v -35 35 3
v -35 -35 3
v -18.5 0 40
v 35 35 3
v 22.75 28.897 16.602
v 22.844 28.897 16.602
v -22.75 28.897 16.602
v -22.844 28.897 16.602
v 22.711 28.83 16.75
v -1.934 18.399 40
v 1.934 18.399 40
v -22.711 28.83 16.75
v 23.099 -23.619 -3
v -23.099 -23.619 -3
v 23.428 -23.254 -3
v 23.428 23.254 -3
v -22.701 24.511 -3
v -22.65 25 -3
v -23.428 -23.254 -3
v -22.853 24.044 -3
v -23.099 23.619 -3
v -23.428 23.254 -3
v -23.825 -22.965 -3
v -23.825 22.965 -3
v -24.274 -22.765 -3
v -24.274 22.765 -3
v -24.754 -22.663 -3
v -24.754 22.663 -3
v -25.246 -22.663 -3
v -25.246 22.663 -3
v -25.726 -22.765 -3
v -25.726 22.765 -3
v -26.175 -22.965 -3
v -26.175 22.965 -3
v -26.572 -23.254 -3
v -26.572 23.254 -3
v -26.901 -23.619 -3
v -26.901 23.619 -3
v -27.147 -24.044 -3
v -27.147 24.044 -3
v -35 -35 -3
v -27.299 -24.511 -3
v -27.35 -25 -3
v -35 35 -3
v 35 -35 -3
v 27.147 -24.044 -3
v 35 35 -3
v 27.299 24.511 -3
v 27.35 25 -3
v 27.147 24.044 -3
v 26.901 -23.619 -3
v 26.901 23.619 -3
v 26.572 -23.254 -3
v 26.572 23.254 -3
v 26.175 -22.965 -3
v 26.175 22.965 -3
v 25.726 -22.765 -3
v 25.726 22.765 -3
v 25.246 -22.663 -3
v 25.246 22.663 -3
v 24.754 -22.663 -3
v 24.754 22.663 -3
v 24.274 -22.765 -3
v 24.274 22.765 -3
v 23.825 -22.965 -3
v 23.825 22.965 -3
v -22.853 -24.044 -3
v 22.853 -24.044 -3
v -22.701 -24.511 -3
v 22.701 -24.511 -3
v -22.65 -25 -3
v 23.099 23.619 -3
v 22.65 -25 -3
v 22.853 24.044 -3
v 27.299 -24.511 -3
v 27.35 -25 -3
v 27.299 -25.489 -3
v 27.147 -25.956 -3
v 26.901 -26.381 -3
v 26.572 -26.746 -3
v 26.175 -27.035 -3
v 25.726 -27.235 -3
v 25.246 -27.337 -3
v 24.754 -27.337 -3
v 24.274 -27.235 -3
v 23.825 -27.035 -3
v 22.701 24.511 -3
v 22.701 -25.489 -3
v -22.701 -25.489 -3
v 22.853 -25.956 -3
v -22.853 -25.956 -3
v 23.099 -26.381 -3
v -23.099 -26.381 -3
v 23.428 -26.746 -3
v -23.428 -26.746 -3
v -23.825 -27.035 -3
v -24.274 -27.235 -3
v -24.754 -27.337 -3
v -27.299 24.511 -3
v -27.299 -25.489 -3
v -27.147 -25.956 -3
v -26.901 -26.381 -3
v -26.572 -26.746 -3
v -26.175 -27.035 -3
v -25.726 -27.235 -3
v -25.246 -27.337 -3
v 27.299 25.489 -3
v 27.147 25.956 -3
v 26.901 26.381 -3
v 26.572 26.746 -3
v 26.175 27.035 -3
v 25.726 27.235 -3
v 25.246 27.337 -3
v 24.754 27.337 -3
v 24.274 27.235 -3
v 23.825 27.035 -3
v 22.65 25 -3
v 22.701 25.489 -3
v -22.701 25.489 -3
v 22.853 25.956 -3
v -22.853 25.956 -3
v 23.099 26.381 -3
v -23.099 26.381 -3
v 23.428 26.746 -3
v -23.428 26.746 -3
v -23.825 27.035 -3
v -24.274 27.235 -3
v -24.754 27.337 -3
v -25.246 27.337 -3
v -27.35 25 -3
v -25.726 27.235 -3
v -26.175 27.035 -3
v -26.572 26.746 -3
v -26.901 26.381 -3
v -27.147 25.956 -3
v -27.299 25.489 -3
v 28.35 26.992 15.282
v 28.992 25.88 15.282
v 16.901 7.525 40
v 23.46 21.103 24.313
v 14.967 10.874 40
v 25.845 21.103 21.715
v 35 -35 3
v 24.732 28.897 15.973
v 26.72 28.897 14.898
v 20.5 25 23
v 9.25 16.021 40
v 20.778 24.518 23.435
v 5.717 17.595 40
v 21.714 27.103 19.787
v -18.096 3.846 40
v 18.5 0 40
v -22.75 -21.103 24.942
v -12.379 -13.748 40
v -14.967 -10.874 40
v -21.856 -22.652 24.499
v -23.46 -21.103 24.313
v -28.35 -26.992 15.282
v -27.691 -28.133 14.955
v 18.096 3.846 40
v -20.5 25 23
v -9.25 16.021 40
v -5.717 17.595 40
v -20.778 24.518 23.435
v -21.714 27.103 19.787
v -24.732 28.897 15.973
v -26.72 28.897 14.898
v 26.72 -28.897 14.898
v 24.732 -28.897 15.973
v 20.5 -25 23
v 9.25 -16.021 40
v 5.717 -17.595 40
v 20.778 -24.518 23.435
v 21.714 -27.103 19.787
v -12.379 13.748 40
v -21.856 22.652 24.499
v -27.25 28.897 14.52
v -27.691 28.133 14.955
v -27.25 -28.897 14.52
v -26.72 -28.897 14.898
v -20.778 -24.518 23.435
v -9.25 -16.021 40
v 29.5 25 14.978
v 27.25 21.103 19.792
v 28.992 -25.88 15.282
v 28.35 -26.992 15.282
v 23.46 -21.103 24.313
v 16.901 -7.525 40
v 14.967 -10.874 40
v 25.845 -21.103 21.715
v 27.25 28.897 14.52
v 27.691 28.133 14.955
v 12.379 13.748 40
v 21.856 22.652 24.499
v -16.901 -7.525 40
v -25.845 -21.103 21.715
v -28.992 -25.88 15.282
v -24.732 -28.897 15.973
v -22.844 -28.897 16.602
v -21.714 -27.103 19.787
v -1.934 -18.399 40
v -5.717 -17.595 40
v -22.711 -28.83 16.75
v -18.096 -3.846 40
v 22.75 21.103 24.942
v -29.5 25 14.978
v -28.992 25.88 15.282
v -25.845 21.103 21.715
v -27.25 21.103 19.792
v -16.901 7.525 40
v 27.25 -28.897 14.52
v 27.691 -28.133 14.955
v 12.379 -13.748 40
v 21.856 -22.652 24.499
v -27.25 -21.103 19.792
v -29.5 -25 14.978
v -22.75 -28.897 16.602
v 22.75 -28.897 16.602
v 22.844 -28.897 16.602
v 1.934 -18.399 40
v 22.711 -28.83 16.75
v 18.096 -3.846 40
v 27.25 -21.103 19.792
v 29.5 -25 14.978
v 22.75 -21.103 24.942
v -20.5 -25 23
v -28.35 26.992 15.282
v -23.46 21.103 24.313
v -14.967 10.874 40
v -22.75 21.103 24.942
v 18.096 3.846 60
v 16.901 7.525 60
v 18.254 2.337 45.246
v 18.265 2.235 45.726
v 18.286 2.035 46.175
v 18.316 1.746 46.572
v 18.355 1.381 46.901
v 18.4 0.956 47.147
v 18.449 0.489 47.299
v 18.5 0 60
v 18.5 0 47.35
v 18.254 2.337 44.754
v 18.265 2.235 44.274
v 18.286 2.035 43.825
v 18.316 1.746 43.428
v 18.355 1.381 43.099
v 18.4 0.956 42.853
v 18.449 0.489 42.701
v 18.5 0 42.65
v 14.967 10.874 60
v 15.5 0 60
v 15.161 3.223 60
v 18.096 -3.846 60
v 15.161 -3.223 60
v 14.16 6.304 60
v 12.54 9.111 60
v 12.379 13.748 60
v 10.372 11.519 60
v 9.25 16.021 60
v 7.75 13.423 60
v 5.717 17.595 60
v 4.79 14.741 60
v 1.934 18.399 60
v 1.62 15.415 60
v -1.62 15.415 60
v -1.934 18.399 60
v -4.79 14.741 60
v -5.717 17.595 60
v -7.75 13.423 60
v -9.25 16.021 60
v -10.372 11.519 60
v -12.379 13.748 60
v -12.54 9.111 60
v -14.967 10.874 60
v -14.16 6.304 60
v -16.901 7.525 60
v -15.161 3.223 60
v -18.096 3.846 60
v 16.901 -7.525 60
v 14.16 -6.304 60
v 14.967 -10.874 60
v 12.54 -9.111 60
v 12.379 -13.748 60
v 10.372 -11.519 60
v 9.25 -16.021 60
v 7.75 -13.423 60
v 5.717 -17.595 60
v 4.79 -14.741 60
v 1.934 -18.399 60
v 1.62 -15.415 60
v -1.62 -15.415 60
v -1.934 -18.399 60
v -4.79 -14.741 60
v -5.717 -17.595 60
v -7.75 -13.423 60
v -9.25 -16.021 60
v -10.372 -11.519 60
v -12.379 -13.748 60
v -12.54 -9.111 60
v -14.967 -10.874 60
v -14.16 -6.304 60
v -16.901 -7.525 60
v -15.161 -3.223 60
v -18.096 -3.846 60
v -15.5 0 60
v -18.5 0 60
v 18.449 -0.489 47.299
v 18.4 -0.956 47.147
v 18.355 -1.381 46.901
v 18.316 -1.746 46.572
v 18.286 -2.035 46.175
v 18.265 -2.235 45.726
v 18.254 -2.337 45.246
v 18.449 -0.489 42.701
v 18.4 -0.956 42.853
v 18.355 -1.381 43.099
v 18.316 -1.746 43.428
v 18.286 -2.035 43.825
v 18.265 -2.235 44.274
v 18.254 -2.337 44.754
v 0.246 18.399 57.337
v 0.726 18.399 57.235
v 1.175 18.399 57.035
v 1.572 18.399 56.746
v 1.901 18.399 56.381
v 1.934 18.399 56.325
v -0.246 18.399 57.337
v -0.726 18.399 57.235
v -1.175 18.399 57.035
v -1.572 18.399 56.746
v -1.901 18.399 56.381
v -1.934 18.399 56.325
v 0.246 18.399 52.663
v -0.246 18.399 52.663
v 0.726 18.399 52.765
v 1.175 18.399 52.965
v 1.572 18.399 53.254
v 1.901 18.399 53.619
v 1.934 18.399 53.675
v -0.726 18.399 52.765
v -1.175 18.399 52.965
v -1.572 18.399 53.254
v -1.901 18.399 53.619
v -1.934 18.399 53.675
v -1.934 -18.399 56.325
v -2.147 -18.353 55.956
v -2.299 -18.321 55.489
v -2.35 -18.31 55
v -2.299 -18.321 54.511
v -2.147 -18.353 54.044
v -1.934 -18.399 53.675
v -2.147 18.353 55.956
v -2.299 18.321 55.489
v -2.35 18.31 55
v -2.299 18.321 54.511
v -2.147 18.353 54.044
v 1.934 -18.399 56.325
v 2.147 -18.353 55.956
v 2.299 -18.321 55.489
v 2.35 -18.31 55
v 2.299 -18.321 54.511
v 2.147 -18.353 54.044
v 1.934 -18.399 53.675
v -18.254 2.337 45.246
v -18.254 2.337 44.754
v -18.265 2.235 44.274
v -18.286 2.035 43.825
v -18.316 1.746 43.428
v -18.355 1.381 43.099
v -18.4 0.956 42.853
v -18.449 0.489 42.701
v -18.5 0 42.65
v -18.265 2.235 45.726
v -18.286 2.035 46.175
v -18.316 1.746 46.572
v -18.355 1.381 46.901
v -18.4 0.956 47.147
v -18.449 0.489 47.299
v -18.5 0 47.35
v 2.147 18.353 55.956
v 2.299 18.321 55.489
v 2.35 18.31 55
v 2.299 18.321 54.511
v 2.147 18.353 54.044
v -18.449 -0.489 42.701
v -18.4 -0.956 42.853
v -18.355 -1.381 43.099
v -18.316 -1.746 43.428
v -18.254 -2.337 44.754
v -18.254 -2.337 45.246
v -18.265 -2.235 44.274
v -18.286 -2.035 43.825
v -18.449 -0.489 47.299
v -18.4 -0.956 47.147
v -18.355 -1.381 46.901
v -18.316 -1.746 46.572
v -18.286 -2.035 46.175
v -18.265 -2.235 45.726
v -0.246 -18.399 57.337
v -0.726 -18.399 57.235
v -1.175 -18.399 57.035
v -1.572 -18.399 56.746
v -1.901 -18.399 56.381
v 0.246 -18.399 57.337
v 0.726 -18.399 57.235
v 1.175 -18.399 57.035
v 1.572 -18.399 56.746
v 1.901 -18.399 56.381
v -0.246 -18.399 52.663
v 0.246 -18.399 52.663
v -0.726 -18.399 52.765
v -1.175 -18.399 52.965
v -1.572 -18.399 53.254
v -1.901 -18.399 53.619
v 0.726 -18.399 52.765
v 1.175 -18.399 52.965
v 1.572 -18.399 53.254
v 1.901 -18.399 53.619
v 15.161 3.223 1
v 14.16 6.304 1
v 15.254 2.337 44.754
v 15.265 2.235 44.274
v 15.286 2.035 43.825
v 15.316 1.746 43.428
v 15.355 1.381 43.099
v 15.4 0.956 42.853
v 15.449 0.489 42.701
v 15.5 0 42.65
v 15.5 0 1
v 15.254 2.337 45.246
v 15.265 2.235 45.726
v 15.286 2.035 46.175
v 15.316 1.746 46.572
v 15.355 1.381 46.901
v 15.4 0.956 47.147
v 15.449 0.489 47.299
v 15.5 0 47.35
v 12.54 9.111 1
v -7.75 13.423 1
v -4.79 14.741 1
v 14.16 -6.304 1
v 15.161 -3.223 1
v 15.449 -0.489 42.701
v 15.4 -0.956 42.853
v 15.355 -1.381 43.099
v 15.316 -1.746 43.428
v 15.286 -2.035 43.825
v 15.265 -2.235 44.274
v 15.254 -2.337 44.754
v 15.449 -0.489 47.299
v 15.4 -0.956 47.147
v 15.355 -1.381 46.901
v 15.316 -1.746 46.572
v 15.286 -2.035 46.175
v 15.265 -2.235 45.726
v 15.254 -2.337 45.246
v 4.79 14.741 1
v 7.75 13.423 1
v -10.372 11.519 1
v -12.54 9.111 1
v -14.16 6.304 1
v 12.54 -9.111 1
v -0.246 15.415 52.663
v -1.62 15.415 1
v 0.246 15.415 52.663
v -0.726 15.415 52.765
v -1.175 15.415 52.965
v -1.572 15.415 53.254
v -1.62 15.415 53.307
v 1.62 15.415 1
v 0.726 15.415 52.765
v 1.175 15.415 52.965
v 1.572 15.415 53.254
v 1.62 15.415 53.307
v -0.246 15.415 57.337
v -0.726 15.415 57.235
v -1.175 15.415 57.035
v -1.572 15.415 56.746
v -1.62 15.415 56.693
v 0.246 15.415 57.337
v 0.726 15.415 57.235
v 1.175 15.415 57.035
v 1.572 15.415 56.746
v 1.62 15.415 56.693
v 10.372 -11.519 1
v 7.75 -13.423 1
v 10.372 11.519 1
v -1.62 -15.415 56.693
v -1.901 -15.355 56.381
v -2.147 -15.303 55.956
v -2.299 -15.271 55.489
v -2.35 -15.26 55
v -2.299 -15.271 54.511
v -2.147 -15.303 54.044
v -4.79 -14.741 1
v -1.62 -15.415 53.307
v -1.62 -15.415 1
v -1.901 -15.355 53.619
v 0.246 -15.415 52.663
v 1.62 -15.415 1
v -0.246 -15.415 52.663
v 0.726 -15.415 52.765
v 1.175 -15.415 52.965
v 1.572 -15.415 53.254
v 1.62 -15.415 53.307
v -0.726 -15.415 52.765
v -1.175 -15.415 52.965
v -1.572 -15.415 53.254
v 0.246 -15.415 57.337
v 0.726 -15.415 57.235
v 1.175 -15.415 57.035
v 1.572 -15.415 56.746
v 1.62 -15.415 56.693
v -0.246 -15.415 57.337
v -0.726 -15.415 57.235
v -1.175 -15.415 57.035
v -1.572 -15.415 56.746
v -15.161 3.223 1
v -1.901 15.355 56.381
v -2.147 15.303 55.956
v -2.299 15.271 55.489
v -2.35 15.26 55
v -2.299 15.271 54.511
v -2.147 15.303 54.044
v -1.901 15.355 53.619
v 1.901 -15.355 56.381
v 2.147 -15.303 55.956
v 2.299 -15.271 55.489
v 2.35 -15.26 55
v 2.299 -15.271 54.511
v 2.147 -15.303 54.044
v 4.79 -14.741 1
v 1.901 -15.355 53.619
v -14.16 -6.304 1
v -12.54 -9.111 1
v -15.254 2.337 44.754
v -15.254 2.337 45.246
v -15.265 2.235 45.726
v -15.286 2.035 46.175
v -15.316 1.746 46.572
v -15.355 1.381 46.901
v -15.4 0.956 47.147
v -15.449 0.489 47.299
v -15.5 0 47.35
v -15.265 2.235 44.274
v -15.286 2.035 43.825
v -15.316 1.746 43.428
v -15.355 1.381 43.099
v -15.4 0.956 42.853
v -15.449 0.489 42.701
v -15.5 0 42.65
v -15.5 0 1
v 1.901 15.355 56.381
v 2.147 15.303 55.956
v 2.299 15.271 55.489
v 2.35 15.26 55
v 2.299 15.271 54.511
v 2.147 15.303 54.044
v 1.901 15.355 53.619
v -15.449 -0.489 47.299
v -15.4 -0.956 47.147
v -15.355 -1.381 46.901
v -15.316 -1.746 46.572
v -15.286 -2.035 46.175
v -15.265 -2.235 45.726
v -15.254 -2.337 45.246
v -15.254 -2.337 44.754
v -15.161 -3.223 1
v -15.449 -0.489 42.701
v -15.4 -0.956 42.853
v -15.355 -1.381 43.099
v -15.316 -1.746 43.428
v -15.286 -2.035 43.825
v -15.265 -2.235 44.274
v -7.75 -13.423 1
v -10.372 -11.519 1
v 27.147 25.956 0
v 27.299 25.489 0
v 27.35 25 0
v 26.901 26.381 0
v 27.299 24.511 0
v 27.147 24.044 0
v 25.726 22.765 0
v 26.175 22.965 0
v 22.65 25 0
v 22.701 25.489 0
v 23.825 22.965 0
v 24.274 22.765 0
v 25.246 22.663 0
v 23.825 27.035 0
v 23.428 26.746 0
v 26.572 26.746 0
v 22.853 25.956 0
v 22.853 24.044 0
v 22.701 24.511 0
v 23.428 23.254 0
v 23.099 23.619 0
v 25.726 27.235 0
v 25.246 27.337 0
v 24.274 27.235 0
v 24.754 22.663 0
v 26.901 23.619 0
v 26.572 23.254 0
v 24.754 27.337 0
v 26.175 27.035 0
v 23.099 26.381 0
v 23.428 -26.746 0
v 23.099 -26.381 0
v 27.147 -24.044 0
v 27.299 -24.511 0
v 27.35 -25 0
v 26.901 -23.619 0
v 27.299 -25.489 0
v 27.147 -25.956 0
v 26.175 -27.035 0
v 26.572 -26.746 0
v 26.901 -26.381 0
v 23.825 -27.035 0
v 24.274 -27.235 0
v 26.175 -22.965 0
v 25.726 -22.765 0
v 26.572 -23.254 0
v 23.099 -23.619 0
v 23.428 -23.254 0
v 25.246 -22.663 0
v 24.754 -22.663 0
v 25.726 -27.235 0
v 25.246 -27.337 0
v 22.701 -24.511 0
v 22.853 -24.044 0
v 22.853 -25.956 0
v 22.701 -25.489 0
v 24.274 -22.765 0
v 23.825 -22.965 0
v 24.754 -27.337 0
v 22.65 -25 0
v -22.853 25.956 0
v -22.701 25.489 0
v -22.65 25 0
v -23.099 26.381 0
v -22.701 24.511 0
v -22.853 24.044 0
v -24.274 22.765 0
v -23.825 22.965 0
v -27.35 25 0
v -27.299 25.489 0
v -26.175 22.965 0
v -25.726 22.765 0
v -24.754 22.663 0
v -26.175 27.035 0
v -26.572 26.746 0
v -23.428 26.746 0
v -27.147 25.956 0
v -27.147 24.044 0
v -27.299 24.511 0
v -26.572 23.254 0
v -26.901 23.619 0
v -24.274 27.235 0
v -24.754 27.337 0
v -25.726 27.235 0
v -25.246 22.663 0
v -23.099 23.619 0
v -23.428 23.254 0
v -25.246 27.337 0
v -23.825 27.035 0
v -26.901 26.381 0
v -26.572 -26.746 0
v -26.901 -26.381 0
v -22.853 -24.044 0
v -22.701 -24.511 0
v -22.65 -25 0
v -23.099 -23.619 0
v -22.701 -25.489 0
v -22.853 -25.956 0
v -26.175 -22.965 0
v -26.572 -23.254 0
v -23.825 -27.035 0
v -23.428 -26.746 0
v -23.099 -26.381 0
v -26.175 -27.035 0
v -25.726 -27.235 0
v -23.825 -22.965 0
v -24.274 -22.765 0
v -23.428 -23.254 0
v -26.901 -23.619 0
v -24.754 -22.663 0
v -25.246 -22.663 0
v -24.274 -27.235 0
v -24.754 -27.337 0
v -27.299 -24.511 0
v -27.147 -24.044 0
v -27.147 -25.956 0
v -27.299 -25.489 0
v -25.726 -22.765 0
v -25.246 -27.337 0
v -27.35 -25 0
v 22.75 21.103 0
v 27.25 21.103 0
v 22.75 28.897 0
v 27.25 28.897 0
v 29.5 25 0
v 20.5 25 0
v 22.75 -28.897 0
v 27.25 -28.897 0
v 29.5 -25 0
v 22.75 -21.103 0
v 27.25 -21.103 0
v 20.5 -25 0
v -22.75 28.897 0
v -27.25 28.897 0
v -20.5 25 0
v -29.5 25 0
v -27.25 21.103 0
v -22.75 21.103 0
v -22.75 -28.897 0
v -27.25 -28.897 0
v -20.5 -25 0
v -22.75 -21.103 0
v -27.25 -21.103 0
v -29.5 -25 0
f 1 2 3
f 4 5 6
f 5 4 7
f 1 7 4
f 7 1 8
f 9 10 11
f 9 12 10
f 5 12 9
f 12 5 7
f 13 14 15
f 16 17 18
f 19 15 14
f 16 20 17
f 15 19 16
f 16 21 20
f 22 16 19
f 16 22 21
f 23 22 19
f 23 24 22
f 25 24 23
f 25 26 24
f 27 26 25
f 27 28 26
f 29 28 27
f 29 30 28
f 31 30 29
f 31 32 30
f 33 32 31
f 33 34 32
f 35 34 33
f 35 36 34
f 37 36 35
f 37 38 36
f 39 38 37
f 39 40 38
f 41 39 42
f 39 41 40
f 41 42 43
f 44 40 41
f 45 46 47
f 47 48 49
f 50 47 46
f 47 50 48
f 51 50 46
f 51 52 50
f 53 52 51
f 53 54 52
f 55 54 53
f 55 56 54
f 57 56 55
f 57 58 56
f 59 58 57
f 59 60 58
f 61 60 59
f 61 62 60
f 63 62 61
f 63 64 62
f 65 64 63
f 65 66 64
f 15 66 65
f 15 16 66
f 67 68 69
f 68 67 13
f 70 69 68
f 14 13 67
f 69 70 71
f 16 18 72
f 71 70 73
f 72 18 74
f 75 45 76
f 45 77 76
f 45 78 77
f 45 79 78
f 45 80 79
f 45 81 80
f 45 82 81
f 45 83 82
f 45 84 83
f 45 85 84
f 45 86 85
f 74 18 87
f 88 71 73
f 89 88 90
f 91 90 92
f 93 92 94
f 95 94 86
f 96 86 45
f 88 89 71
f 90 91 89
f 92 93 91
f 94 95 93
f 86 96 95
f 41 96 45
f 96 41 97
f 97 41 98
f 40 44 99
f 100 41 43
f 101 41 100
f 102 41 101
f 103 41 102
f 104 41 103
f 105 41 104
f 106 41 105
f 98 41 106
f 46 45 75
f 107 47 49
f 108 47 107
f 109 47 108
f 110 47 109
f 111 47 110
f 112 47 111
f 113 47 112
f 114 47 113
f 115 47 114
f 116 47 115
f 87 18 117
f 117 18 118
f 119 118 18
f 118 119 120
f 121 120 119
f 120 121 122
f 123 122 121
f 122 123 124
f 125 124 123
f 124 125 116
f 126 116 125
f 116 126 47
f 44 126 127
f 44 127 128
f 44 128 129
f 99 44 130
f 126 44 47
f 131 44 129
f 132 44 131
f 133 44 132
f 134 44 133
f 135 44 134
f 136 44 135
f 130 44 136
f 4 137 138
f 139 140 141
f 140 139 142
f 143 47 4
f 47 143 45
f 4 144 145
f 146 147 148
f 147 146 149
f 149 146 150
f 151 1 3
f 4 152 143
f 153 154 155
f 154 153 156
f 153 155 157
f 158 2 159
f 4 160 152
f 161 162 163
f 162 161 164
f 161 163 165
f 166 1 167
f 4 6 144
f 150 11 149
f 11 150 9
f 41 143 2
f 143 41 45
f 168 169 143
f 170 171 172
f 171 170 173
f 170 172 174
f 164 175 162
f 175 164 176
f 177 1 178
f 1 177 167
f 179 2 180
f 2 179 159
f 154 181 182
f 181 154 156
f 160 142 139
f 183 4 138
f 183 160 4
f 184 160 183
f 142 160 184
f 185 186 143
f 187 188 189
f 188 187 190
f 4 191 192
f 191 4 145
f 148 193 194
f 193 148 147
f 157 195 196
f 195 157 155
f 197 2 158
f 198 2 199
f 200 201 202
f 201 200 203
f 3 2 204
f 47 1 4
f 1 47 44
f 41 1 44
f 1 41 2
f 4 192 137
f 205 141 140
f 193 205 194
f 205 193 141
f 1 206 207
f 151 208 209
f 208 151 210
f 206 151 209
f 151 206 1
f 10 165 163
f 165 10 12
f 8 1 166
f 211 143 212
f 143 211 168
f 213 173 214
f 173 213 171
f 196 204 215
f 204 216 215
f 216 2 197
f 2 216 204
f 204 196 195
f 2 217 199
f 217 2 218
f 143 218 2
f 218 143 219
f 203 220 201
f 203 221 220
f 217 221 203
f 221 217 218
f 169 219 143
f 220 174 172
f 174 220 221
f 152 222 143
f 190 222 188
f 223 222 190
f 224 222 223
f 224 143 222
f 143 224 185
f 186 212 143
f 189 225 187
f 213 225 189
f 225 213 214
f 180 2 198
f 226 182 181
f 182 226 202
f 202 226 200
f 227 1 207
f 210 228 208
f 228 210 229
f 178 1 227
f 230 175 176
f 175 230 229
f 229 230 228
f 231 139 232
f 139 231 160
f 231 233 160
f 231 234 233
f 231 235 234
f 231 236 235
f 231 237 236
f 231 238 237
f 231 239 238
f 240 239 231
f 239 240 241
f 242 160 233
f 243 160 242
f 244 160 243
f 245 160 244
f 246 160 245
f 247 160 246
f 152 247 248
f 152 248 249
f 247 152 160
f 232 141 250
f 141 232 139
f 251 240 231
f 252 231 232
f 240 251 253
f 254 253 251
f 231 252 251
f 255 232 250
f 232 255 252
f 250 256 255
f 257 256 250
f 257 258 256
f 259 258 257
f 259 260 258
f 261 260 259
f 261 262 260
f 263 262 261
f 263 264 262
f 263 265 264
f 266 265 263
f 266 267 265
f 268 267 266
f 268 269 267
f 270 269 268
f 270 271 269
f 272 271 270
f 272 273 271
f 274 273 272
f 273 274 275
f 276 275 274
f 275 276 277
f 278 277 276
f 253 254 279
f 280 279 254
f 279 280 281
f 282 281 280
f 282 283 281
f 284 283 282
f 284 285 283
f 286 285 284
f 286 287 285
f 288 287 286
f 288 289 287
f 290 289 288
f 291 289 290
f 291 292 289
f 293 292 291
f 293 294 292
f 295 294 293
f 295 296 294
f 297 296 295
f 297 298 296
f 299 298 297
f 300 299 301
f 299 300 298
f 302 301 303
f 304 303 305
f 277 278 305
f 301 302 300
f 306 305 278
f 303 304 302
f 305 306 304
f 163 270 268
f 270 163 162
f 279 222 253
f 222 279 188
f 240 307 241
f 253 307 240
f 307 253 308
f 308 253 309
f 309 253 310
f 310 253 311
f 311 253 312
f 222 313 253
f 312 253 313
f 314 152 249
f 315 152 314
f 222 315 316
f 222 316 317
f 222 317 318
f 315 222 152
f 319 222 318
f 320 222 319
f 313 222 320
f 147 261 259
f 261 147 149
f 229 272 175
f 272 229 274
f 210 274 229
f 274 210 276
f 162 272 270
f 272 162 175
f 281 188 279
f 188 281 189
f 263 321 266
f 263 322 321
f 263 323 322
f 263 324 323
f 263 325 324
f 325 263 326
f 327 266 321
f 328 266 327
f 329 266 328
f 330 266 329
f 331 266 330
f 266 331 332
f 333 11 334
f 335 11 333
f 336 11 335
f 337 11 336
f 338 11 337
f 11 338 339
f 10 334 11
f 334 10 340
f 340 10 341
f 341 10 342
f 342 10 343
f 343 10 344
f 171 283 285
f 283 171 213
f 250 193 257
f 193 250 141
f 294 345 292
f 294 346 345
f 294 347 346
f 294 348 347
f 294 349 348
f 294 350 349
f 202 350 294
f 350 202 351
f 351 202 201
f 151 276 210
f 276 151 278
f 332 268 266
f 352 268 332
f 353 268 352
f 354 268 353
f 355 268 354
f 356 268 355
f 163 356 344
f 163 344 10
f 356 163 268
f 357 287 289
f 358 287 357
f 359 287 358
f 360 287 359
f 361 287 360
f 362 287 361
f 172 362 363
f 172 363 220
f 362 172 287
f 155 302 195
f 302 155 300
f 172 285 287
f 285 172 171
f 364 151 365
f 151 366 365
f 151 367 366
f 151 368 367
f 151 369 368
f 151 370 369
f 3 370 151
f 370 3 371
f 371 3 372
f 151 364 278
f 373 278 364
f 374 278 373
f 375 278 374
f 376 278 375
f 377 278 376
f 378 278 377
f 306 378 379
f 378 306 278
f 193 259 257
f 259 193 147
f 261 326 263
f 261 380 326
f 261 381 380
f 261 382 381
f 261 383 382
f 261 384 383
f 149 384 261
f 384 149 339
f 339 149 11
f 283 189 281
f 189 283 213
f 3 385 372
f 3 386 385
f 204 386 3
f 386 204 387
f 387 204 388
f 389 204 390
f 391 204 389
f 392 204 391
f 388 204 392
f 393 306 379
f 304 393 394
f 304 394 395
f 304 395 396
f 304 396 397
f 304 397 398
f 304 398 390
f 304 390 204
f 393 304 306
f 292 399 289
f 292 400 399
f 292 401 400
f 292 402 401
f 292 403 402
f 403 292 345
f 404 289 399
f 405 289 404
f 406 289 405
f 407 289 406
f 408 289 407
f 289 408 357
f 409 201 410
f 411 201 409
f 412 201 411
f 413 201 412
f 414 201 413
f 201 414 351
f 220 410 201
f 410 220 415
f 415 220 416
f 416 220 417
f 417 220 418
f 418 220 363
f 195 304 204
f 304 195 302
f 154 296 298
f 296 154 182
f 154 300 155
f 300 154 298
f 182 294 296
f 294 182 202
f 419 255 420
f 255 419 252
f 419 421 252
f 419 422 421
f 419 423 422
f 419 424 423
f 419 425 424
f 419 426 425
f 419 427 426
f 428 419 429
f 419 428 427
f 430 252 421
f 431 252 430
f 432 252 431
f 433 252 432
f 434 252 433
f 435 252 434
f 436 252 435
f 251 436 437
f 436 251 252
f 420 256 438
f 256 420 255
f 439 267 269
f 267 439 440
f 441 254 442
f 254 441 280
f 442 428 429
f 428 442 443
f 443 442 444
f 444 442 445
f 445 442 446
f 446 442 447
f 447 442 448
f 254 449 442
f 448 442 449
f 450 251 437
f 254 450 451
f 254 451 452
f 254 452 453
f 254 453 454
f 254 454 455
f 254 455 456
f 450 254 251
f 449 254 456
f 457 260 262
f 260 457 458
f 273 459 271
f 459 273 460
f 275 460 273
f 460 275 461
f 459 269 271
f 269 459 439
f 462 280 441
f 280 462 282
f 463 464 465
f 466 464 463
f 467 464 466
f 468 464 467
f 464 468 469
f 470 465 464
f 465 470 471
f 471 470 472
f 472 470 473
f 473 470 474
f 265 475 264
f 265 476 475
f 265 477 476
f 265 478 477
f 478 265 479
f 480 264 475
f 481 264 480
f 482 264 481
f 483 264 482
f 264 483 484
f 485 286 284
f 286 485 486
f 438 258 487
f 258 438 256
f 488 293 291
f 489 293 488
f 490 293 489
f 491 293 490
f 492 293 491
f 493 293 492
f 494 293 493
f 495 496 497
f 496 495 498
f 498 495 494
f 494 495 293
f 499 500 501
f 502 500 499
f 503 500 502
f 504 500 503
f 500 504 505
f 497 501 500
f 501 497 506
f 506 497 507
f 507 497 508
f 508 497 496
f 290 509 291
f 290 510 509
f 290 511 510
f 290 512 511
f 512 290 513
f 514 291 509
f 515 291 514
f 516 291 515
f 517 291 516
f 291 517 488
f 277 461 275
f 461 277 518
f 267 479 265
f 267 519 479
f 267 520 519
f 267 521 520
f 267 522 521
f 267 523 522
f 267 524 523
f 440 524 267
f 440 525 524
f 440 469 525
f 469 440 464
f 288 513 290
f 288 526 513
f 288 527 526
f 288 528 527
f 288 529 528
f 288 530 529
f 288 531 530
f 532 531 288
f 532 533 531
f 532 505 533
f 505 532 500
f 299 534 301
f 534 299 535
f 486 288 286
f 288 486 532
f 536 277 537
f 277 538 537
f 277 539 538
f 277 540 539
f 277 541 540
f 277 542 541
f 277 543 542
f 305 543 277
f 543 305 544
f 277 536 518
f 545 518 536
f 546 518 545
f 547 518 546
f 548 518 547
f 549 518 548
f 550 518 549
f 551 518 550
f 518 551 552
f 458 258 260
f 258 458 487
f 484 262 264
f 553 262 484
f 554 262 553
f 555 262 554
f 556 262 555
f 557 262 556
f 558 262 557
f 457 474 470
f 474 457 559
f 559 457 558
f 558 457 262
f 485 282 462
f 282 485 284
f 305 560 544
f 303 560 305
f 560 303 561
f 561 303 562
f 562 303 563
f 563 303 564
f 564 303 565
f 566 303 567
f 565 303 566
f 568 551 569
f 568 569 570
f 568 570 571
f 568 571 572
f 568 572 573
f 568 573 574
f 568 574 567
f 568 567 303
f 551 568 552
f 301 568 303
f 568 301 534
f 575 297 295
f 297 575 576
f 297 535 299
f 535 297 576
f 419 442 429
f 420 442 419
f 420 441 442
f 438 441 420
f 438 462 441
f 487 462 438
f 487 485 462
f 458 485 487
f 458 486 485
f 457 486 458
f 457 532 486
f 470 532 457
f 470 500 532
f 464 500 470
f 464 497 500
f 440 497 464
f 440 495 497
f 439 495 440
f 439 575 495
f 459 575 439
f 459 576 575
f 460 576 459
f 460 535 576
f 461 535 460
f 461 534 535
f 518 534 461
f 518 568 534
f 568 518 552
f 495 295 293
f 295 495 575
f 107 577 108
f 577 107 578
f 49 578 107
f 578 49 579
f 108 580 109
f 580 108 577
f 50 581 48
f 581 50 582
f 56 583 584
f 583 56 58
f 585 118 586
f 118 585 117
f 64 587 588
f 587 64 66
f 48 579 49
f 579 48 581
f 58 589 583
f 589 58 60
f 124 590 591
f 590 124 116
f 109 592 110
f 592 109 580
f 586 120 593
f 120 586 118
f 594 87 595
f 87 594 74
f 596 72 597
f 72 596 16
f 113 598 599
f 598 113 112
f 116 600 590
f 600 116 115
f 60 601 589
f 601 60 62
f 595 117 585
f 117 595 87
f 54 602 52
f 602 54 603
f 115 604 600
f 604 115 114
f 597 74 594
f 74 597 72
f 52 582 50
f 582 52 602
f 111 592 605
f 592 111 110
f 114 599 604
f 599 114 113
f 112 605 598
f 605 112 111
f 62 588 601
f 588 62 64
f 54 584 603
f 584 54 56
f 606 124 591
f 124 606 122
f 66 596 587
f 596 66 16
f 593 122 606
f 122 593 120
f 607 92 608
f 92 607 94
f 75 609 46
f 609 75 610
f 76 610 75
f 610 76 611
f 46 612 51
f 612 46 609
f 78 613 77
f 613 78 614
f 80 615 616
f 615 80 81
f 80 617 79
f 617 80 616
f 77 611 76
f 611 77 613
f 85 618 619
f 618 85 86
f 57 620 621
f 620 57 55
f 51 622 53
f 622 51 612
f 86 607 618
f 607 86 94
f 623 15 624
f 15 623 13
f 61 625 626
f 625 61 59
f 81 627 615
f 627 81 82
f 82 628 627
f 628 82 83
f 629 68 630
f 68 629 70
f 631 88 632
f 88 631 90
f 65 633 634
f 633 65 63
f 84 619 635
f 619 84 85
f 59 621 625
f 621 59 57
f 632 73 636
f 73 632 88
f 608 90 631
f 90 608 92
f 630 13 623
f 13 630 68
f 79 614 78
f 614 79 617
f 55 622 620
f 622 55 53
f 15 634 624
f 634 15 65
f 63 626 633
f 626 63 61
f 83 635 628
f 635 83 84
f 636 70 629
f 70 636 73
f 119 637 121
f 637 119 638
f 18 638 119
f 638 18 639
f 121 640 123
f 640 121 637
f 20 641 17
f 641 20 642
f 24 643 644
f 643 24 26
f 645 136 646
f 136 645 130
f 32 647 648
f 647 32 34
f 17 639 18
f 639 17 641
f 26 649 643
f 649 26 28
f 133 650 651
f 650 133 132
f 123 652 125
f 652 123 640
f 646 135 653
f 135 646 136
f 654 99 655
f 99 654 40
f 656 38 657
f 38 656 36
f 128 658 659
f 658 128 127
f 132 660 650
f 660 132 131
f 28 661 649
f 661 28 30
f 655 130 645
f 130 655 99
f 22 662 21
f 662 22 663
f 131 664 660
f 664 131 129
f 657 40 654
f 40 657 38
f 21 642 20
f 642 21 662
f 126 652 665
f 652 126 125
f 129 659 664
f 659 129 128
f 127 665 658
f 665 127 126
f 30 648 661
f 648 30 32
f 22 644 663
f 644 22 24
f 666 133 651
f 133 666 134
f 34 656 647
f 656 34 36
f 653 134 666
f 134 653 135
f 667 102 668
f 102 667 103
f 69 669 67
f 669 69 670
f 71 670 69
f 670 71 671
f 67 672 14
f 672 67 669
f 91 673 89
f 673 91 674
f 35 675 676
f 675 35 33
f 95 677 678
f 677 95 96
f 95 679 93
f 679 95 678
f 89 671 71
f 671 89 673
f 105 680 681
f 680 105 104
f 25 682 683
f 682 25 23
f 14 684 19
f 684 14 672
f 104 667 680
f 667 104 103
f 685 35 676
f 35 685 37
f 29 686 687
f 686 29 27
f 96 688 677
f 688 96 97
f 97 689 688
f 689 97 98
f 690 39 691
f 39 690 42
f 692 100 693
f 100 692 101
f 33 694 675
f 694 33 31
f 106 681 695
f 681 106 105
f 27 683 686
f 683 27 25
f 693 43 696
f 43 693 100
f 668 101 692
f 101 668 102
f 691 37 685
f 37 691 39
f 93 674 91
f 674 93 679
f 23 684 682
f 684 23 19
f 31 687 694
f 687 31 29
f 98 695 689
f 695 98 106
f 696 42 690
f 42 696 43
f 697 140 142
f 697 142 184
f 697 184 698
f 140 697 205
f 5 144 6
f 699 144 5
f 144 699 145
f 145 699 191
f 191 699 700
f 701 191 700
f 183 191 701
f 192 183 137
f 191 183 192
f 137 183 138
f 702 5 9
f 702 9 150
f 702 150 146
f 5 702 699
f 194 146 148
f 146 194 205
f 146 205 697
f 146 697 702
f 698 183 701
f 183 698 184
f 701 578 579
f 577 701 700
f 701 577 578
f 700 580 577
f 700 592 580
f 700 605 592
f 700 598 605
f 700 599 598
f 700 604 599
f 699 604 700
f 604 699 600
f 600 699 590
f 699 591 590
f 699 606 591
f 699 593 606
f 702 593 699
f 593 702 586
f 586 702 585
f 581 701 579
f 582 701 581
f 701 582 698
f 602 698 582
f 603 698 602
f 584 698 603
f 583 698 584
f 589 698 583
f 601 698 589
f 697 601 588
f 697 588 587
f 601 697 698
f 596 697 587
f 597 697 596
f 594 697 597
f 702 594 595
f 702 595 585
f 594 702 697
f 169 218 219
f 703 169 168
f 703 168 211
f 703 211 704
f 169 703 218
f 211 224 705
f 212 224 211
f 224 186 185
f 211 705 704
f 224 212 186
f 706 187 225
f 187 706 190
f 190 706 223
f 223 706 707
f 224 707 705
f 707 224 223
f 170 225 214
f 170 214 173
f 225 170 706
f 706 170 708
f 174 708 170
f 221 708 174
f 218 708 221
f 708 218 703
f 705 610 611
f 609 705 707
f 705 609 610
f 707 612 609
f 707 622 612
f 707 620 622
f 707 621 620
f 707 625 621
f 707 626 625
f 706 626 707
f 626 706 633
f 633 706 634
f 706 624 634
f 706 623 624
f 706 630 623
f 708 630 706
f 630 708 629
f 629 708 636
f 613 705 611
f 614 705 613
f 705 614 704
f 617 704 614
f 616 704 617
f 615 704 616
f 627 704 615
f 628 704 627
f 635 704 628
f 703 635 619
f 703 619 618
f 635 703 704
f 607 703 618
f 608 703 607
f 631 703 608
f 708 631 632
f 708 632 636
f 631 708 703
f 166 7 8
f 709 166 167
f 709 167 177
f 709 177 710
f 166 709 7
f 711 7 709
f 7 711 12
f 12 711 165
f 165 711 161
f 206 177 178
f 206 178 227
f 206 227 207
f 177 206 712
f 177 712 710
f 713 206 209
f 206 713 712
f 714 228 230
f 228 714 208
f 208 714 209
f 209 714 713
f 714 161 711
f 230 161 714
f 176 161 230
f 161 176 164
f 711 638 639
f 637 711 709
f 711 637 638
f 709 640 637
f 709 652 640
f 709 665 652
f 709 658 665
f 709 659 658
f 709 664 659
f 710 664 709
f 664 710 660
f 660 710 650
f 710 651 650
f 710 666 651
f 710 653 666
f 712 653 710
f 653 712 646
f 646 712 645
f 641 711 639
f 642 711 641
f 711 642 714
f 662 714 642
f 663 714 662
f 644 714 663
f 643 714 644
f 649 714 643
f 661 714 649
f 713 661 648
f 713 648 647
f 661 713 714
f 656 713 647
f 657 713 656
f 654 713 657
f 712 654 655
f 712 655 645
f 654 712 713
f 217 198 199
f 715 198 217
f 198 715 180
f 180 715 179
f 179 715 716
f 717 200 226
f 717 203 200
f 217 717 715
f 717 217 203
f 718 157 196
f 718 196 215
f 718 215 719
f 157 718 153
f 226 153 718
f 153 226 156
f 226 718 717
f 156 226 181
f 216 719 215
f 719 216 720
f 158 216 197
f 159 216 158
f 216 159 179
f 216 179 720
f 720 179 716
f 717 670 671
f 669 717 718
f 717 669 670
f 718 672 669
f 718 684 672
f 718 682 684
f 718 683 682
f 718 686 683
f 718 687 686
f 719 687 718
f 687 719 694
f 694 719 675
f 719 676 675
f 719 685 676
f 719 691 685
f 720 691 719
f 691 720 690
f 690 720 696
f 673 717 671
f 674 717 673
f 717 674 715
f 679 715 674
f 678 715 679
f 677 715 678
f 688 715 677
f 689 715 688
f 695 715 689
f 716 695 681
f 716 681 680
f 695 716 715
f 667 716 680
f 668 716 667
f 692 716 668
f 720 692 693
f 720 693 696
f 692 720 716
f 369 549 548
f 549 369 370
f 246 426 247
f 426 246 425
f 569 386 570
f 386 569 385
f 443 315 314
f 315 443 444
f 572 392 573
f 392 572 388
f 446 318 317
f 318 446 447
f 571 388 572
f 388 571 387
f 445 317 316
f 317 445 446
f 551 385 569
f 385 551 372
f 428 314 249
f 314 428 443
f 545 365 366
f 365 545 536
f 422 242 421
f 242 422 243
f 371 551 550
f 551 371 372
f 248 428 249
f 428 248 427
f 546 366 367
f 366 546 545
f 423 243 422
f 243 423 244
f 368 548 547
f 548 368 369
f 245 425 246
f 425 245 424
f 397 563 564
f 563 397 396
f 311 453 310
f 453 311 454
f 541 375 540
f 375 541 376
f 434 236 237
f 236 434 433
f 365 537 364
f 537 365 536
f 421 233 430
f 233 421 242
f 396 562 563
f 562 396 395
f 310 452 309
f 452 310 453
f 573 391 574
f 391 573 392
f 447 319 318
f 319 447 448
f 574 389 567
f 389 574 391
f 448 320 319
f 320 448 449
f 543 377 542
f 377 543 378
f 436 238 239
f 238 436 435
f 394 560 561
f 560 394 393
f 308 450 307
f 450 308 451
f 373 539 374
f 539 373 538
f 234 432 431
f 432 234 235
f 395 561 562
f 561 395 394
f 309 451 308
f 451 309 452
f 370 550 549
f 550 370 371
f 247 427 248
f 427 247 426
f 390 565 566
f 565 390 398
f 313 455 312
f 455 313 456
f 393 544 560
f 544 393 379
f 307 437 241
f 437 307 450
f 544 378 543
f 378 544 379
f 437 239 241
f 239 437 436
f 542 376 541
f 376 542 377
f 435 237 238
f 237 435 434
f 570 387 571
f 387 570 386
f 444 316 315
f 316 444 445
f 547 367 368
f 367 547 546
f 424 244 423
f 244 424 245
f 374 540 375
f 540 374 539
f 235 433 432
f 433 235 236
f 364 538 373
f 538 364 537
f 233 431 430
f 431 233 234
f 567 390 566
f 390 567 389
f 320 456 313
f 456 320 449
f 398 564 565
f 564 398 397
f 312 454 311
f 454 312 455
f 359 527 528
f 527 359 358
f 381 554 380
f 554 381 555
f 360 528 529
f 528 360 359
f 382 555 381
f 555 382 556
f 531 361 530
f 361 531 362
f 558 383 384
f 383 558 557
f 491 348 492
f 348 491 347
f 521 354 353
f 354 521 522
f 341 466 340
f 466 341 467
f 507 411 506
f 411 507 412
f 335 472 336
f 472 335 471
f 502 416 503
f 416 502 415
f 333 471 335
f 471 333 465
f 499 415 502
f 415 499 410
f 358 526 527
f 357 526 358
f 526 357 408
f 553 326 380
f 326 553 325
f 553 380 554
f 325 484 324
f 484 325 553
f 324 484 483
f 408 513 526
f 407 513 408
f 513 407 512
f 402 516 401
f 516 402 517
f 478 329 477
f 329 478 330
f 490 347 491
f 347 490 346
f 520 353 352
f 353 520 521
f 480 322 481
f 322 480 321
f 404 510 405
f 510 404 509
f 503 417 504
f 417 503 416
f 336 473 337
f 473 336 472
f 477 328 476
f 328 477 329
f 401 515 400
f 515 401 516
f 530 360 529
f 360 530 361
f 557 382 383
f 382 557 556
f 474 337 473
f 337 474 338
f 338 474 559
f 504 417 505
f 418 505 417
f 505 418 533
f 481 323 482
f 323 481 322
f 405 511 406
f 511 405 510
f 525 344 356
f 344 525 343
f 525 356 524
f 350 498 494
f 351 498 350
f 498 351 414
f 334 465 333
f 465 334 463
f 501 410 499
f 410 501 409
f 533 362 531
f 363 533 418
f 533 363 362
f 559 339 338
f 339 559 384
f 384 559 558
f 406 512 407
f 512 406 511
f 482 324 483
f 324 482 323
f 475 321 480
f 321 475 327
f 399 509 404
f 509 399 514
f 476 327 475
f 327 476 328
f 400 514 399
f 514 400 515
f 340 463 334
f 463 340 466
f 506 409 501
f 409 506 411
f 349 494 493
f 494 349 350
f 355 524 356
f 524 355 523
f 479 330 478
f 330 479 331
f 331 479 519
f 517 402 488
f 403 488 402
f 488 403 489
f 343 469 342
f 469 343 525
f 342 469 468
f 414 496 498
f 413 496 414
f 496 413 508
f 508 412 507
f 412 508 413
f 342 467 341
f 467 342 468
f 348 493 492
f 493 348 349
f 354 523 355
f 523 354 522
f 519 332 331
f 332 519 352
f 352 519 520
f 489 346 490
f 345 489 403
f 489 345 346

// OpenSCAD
module m3(H){
	cylinder(r=1.75,h=H,$fn=30,center=true);
}
module m4(H){
	cylinder(r=2.35,h=H,$fn=30,center=true);
}
module t_m4(H){
	cylinder(r=4.5,h=H,$fn=6);
}
module c_m(H){
	cylinder(r=6,h=H,$fn=30);
}

radio_base=20;
radio_barra=31/2;
servo_x=69;
servo_y=33;
c_servo_x=servo_x+40;
c_servo_y=servo_y;

module maxiservo(H){
	cube([servo_x,servo_y,H],center=true);
	translate([37.5,9,0])m4(H);
	translate([37.5,-9,0])m4(H);
	translate([-37.5,9,0])m4(H);
	translate([-37.5,-9,0])m4(H);
}

module base(){
	//%cylinder(r=radio_base,h=300,center=true);
	difference(){
		union(){
			hull(){
				cylinder(r=radio_barra+3,h=40);
				cube([2*radio_base+30,2*radio_base+30,6],center=true);
			}
			cylinder(r=radio_barra+3,h=60);
		}
		translate([0,0,1])cylinder(r=radio_barra,h=100);

		translate([radio_base+5,radio_base+5,1])m4(100);
		translate([radio_base+5,-(radio_base+5),1])m4(100);
		translate([-(radio_base+5),radio_base+5,1])m4(100);
		translate([-(radio_base+5),-(radio_base+5),1])m4(100);

		translate([radio_base+5,radio_base+5,0])t_m4(100);
		translate([radio_base+5,-(radio_base+5),0])t_m4(100);
		translate([-(radio_base+5),radio_base+5,0])t_m4(100);
		translate([-(radio_base+5),-(radio_base+5),0])t_m4(100);

		translate([0,0,45])rotate([0,90,0])m4(100);
		translate([0,0,55])rotate([90,0,0])m4(100);

	}
}

module adaptador(){
	difference(){
		hull(){
			translate([0,0,11])
				cube([2*radio_base+30,2*radio_base+30,22],center=true);
			translate([30,0,0])cylinder(r=34,h=22);
		}

		translate([(servo_x-servo_y)/2,0,0])maxiservo(100);
		translate([radio_base+5,radio_base+5,0])m4(100);
		translate([radio_base+5,-(radio_base+5),0])m4(100);
		translate([-(radio_base+5),radio_base+5,0])m4(100);
		translate([-(radio_base+5),-(radio_base+5),0])m4(100);
		translate([0,0,12])cylinder(r=22,h=100);	


		translate([0,0,10]){
			translate([radio_base+5,radio_base+5,0])c_m(100);
			translate([radio_base+5,-(radio_base+5),0])c_m(100);
			translate([-(radio_base+5),radio_base+5,0])c_m(100);
			translate([-(radio_base+5),-(radio_base+5),0])c_m(100);
			translate([0,0,10])cylinder(r=22,h=100);
		}

		translate([0,0,-1]){
			translate([radio_base+5,radio_base+5,0])c_m(6);
			translate([radio_base+5,-(radio_base+5),0])c_m(6);
			translate([-(radio_base+5),radio_base+5,0])c_m(6);
			translate([-(radio_base+5),-(radio_base+5),0])c_m(6);
		}

		translate([-26,-c_servo_y/2,10])
			cube([c_servo_x,c_servo_y,50]);
	
		cube([200,4,8],center=true);
	}
}

module pan(){
	difference(){
		union(){
			difference(){
				hull(){
					translate([0,0,0])cylinder(r=40,h=20);
					translate([12.3,0,50])rotate([0,45,0])cube([85,36,29],center=true);
				}
				translate([-100,18,10])cube([200,12,100]);
				translate([-100,-58,10])cube([200,40,100]);
			}
			hull(){
				translate([0,30,62])rotate([-90,0,0])cylinder(r=20,h=10);
				translate([0,35,10])cube([70,10,20],center=true);
			}
			hull(){
				cylinder(r=35,h=10);
				translate([0,35,5])cube([70,10,10],center=true);
			}
		}
		translate([12.3,0,50])rotate([90,45,0])maxiservo(50);
	}
}




base();
//adaptador();
//pan();
